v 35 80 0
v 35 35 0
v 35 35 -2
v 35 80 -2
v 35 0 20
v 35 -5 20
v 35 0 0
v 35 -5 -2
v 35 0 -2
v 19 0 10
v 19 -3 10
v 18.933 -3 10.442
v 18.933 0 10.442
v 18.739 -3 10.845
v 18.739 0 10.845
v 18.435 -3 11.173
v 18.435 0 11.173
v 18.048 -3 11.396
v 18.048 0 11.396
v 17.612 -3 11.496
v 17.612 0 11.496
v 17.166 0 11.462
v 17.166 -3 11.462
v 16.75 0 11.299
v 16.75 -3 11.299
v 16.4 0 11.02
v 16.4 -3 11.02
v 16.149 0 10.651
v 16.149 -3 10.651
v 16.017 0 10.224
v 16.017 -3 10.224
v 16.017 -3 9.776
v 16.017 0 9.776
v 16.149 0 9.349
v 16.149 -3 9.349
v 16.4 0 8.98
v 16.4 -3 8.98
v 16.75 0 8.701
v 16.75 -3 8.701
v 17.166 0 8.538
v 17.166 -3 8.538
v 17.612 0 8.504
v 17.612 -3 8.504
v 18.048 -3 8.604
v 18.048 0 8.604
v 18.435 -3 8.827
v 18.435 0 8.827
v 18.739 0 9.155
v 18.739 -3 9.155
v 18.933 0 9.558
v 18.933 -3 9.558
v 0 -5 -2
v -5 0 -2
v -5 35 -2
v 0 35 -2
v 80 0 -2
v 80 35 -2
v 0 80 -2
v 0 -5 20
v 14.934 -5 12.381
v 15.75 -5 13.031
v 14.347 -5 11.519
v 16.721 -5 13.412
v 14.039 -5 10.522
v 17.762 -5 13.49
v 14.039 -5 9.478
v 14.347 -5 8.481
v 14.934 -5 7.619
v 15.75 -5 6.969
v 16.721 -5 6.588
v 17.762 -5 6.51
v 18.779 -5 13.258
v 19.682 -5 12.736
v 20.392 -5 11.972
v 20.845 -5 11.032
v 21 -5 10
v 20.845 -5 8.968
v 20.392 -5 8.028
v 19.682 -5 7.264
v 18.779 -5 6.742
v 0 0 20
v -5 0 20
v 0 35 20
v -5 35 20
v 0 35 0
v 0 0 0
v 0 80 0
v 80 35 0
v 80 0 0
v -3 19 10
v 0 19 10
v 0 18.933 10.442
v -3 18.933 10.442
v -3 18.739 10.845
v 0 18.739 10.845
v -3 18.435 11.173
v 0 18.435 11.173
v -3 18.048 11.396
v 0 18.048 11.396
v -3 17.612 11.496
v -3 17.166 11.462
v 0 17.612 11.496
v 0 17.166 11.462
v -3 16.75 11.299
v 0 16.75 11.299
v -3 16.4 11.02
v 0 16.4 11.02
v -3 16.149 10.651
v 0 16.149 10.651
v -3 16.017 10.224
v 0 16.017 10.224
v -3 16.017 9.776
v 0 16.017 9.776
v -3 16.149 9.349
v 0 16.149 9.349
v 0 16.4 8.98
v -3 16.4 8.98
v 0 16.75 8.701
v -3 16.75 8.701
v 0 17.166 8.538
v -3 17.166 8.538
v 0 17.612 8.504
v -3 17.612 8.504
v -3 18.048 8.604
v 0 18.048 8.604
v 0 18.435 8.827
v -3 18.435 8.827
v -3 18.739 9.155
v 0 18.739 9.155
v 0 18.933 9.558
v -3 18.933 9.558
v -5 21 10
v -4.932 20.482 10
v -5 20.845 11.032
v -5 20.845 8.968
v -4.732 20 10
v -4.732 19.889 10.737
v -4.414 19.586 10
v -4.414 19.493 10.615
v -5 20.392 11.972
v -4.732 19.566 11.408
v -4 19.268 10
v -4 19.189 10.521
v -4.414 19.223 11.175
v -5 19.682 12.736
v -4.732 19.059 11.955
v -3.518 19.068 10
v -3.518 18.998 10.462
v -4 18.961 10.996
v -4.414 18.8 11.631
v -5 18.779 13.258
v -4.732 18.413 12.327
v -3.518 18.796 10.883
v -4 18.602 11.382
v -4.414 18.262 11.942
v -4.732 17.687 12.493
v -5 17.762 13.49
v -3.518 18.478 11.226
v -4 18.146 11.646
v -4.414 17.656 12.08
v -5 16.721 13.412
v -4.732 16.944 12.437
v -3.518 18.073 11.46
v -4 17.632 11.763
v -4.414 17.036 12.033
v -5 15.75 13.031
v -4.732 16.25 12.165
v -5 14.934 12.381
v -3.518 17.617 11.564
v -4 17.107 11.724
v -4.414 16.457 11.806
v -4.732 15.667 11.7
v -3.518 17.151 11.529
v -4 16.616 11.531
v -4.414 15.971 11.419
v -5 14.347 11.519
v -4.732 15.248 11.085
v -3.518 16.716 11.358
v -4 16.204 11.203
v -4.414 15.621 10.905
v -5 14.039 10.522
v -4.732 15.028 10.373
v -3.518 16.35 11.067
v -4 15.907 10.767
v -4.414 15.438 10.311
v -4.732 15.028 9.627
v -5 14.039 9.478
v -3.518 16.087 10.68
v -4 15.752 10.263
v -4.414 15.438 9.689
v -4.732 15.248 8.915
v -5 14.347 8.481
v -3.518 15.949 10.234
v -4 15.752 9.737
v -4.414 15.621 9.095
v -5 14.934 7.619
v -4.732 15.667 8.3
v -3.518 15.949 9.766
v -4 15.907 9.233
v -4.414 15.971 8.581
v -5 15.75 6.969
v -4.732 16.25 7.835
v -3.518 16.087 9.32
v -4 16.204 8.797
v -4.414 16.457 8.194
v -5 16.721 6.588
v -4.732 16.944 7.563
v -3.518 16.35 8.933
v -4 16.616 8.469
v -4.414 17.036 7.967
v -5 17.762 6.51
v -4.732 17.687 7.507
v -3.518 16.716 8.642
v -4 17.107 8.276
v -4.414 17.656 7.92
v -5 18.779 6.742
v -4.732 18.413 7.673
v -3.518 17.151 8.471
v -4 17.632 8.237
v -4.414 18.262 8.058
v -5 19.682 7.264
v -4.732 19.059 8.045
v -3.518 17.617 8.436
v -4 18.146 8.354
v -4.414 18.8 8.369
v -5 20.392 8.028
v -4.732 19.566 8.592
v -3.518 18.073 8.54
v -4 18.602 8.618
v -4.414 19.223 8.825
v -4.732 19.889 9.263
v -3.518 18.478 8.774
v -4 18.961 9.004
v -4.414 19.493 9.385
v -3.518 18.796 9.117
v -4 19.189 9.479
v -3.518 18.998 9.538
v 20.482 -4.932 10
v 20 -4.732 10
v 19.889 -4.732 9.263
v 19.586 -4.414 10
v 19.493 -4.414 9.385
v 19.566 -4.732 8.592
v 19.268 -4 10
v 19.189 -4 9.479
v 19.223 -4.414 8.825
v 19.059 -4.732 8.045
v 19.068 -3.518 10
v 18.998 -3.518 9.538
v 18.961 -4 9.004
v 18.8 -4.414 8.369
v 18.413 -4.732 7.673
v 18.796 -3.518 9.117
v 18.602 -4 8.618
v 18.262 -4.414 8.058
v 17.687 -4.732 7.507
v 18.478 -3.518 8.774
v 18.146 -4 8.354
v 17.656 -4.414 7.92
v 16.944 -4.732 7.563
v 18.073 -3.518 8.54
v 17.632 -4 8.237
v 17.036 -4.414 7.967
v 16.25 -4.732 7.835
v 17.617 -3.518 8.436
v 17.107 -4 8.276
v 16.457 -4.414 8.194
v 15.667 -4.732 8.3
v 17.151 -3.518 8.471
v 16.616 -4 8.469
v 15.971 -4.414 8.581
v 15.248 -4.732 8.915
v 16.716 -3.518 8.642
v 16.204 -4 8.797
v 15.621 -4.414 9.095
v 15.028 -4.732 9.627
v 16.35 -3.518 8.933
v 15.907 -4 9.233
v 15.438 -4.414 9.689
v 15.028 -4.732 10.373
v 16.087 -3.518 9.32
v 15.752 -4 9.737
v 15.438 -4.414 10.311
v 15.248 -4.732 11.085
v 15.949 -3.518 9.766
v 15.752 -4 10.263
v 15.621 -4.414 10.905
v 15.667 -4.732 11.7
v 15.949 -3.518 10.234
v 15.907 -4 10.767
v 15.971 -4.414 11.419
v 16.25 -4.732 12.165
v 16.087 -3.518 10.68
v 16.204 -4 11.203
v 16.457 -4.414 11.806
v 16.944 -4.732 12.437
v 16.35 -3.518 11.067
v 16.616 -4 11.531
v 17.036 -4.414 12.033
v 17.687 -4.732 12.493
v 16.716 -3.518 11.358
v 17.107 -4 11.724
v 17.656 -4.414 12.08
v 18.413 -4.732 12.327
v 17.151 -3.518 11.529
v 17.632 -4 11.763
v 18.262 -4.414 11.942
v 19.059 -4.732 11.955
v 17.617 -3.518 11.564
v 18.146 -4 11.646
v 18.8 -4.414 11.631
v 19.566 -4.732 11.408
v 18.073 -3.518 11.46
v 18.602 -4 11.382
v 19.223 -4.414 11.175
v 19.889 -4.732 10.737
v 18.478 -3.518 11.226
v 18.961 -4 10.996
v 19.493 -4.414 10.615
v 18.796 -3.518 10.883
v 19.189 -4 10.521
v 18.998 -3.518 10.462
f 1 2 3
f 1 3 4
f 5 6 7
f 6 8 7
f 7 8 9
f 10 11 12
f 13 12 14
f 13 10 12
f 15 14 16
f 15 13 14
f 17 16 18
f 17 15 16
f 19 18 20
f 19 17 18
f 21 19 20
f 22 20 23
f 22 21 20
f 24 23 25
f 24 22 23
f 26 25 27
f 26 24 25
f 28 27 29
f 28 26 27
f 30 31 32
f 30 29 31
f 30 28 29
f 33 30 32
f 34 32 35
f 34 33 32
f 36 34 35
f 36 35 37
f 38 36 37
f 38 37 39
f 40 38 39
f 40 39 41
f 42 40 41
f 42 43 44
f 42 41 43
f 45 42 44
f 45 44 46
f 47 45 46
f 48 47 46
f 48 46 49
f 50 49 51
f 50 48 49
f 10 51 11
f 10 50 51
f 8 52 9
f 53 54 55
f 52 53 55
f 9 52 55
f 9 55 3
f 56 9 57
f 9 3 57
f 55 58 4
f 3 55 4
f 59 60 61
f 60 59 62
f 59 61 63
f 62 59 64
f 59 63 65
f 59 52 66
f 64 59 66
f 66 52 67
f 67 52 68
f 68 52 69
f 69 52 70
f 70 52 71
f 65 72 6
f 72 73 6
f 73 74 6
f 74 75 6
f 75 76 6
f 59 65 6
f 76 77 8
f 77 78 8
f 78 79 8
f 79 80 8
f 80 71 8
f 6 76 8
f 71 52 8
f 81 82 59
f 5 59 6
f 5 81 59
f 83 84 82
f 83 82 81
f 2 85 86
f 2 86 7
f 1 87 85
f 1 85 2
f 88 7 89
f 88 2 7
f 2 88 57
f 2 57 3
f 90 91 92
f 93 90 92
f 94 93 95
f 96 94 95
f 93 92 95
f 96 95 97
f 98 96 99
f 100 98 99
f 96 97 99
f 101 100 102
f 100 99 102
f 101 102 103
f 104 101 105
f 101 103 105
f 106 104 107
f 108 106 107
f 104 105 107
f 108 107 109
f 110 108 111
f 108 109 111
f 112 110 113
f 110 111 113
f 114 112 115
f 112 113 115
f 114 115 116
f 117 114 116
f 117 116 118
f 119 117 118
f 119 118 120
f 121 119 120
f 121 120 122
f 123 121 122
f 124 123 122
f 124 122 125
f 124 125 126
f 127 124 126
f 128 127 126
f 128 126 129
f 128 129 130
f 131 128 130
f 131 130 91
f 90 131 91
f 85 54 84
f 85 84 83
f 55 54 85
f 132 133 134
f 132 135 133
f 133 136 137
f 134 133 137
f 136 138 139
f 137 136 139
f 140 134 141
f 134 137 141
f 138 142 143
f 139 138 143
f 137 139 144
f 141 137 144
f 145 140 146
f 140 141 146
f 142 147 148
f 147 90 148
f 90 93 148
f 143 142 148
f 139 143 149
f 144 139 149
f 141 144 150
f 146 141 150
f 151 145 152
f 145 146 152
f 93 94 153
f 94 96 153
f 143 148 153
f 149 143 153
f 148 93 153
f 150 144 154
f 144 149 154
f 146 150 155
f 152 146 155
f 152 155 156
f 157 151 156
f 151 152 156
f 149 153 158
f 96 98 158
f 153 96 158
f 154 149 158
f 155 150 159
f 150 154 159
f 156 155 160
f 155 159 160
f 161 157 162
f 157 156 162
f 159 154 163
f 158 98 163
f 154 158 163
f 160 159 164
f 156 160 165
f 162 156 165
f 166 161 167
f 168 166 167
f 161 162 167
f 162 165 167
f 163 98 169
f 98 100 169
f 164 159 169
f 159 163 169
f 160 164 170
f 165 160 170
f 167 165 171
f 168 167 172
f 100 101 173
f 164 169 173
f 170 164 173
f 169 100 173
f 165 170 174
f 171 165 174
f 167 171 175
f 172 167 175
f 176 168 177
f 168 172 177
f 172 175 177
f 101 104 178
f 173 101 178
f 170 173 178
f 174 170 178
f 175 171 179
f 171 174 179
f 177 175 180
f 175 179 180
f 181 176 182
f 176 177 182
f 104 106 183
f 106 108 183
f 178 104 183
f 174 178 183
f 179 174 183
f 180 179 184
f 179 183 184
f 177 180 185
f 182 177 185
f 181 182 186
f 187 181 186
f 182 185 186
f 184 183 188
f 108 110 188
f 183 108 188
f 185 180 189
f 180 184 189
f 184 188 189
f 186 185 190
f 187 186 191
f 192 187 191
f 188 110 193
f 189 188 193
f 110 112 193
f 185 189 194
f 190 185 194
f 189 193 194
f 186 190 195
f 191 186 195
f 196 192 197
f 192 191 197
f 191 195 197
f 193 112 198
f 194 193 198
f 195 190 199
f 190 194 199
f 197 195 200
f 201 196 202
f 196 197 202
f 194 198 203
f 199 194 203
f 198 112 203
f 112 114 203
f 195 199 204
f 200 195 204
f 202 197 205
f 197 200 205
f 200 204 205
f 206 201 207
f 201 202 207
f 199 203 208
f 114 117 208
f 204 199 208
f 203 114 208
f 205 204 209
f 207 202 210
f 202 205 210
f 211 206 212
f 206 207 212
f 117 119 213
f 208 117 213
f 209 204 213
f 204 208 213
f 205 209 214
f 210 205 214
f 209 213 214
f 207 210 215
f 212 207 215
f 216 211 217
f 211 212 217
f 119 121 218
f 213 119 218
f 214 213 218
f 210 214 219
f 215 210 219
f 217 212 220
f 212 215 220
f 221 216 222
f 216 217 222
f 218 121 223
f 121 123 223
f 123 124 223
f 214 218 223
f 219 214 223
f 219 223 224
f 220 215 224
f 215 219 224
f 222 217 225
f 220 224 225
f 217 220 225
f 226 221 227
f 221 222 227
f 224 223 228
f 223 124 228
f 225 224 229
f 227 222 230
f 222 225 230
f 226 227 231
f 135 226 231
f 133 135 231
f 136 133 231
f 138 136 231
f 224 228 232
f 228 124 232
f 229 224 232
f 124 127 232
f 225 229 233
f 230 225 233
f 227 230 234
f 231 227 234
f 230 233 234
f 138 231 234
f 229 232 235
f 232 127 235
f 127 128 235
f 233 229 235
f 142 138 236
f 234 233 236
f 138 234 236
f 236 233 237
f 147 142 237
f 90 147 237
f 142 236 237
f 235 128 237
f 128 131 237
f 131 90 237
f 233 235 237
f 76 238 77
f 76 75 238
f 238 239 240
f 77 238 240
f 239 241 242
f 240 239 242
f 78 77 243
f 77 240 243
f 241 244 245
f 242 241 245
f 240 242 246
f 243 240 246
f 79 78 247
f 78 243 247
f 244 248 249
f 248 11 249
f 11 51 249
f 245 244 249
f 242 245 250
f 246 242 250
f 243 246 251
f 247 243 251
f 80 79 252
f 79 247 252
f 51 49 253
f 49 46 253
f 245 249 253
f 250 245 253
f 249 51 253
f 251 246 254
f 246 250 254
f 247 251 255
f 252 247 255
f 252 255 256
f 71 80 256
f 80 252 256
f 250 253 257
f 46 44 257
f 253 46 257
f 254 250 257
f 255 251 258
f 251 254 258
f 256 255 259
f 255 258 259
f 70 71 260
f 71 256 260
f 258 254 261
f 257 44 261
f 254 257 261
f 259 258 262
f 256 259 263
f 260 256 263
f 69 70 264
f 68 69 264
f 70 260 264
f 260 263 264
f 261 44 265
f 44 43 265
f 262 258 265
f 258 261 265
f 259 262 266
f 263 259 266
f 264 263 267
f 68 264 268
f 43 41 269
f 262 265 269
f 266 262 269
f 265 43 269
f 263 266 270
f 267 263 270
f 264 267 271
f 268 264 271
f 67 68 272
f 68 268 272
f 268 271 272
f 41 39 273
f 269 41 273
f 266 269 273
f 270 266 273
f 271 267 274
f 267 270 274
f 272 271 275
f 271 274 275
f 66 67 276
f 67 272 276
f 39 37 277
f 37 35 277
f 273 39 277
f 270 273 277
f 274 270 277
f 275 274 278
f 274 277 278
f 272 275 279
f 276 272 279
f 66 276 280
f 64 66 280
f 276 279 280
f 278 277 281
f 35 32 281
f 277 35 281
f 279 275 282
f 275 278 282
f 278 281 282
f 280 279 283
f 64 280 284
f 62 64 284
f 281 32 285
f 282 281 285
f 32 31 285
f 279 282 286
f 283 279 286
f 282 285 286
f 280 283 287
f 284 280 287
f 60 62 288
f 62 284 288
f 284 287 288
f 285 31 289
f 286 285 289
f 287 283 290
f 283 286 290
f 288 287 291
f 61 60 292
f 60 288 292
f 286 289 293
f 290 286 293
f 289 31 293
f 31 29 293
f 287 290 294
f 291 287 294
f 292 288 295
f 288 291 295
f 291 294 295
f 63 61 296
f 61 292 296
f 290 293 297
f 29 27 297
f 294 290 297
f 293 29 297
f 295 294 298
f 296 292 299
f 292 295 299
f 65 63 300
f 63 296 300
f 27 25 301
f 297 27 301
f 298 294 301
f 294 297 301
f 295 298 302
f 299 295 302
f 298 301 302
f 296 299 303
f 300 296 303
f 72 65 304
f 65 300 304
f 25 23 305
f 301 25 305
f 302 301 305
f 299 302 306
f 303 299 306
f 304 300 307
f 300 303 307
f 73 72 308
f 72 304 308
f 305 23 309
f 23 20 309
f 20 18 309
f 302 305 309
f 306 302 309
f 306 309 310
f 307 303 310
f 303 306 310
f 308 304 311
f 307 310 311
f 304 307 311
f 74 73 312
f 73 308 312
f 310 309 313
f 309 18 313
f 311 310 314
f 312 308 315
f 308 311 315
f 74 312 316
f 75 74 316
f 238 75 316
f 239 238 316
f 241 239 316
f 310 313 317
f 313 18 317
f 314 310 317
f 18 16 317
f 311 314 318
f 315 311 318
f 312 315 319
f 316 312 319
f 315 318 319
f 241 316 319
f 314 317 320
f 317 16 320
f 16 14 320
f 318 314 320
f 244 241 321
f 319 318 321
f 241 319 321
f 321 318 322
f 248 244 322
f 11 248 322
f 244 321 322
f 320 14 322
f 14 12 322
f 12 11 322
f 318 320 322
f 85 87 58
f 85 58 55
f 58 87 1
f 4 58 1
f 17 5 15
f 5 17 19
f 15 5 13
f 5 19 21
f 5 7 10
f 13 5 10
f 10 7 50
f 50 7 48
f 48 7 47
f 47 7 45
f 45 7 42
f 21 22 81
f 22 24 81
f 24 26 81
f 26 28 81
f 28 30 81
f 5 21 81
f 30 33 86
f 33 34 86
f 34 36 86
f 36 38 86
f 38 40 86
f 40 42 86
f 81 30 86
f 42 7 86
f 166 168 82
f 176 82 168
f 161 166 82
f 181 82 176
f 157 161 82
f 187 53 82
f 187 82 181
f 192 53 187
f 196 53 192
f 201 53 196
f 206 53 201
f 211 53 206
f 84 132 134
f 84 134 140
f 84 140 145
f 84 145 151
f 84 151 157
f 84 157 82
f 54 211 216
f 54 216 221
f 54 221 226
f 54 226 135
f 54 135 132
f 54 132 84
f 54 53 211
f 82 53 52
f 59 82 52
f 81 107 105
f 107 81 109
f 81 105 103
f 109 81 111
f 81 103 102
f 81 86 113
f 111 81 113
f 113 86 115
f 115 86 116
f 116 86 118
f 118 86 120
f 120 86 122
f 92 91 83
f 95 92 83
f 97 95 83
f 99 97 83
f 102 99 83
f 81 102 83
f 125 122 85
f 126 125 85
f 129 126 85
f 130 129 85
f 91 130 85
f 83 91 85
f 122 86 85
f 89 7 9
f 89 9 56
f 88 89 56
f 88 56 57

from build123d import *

# Parameters (mm, degrees)
F0_W     = 45
F0_H     = 35
F0_W_2   = 35
F0_H_2   = 45
F0_W_3   = 5
F0_H_3   = 5
F3_DEPTH = 2
F4_DEPTH = 20
F1_R     = 1.5
F5_DEPTH = 25
F2_R     = 1.5
F6_DEPTH = 25
F7_R     = 2


with BuildPart() as f3:
    # F0 (on Top) → F3 (new body)
    with BuildSketch(Plane.XY):
        with Locations((57.5, 17.5)):
            Rectangle(F0_W, F0_H)
        with Locations((17.5, 17.5)):
            Rectangle(F0_W_2, F0_H)
        with Locations((17.5, 57.5)):
            Rectangle(F0_W_2, F0_H_2)
        with Locations((-2.5, 17.5)):
            Rectangle(F0_W_3, F0_H)
        with Locations((17.5, -2.5)):
            Rectangle(F0_W_2, F0_H_3)
        Polygon((0, -5), (0, 0), (-5, 0), align=None)
    extrude(amount=-F3_DEPTH)

    # F0 (on Top) → F4 (join)
    with BuildSketch(Plane.XY):
        Polygon((0, -5), (0, 0), (-5, 0), align=None)
        with Locations((17.5, -2.5)):
            Rectangle(F0_W_2, F0_H_3)
        with Locations((-2.5, 17.5)):
            Rectangle(F0_W_3, F0_H)
    extrude(amount=F4_DEPTH)

    # F1 (on Front) → F5 (cut)
    with BuildSketch(Plane.XZ):
        with Locations((17.5, 10)):
            Circle(F1_R)
    extrude(amount=F5_DEPTH, mode=Mode.SUBTRACT)

    # F2 (on Right) → F6 (cut)
    with BuildSketch(Plane.YZ):
        with Locations((17.5, 10)):
            Circle(F2_R)
    extrude(amount=-F6_DEPTH, mode=Mode.SUBTRACT)

    # F7
    f7_edges = [f3.edges().sort_by_distance(p)[0] for p in [
        (16, -5, 10),
        (-5, 16, 10),
    ]]
    fillet(f7_edges, radius=F7_R)


solid = f3.part
